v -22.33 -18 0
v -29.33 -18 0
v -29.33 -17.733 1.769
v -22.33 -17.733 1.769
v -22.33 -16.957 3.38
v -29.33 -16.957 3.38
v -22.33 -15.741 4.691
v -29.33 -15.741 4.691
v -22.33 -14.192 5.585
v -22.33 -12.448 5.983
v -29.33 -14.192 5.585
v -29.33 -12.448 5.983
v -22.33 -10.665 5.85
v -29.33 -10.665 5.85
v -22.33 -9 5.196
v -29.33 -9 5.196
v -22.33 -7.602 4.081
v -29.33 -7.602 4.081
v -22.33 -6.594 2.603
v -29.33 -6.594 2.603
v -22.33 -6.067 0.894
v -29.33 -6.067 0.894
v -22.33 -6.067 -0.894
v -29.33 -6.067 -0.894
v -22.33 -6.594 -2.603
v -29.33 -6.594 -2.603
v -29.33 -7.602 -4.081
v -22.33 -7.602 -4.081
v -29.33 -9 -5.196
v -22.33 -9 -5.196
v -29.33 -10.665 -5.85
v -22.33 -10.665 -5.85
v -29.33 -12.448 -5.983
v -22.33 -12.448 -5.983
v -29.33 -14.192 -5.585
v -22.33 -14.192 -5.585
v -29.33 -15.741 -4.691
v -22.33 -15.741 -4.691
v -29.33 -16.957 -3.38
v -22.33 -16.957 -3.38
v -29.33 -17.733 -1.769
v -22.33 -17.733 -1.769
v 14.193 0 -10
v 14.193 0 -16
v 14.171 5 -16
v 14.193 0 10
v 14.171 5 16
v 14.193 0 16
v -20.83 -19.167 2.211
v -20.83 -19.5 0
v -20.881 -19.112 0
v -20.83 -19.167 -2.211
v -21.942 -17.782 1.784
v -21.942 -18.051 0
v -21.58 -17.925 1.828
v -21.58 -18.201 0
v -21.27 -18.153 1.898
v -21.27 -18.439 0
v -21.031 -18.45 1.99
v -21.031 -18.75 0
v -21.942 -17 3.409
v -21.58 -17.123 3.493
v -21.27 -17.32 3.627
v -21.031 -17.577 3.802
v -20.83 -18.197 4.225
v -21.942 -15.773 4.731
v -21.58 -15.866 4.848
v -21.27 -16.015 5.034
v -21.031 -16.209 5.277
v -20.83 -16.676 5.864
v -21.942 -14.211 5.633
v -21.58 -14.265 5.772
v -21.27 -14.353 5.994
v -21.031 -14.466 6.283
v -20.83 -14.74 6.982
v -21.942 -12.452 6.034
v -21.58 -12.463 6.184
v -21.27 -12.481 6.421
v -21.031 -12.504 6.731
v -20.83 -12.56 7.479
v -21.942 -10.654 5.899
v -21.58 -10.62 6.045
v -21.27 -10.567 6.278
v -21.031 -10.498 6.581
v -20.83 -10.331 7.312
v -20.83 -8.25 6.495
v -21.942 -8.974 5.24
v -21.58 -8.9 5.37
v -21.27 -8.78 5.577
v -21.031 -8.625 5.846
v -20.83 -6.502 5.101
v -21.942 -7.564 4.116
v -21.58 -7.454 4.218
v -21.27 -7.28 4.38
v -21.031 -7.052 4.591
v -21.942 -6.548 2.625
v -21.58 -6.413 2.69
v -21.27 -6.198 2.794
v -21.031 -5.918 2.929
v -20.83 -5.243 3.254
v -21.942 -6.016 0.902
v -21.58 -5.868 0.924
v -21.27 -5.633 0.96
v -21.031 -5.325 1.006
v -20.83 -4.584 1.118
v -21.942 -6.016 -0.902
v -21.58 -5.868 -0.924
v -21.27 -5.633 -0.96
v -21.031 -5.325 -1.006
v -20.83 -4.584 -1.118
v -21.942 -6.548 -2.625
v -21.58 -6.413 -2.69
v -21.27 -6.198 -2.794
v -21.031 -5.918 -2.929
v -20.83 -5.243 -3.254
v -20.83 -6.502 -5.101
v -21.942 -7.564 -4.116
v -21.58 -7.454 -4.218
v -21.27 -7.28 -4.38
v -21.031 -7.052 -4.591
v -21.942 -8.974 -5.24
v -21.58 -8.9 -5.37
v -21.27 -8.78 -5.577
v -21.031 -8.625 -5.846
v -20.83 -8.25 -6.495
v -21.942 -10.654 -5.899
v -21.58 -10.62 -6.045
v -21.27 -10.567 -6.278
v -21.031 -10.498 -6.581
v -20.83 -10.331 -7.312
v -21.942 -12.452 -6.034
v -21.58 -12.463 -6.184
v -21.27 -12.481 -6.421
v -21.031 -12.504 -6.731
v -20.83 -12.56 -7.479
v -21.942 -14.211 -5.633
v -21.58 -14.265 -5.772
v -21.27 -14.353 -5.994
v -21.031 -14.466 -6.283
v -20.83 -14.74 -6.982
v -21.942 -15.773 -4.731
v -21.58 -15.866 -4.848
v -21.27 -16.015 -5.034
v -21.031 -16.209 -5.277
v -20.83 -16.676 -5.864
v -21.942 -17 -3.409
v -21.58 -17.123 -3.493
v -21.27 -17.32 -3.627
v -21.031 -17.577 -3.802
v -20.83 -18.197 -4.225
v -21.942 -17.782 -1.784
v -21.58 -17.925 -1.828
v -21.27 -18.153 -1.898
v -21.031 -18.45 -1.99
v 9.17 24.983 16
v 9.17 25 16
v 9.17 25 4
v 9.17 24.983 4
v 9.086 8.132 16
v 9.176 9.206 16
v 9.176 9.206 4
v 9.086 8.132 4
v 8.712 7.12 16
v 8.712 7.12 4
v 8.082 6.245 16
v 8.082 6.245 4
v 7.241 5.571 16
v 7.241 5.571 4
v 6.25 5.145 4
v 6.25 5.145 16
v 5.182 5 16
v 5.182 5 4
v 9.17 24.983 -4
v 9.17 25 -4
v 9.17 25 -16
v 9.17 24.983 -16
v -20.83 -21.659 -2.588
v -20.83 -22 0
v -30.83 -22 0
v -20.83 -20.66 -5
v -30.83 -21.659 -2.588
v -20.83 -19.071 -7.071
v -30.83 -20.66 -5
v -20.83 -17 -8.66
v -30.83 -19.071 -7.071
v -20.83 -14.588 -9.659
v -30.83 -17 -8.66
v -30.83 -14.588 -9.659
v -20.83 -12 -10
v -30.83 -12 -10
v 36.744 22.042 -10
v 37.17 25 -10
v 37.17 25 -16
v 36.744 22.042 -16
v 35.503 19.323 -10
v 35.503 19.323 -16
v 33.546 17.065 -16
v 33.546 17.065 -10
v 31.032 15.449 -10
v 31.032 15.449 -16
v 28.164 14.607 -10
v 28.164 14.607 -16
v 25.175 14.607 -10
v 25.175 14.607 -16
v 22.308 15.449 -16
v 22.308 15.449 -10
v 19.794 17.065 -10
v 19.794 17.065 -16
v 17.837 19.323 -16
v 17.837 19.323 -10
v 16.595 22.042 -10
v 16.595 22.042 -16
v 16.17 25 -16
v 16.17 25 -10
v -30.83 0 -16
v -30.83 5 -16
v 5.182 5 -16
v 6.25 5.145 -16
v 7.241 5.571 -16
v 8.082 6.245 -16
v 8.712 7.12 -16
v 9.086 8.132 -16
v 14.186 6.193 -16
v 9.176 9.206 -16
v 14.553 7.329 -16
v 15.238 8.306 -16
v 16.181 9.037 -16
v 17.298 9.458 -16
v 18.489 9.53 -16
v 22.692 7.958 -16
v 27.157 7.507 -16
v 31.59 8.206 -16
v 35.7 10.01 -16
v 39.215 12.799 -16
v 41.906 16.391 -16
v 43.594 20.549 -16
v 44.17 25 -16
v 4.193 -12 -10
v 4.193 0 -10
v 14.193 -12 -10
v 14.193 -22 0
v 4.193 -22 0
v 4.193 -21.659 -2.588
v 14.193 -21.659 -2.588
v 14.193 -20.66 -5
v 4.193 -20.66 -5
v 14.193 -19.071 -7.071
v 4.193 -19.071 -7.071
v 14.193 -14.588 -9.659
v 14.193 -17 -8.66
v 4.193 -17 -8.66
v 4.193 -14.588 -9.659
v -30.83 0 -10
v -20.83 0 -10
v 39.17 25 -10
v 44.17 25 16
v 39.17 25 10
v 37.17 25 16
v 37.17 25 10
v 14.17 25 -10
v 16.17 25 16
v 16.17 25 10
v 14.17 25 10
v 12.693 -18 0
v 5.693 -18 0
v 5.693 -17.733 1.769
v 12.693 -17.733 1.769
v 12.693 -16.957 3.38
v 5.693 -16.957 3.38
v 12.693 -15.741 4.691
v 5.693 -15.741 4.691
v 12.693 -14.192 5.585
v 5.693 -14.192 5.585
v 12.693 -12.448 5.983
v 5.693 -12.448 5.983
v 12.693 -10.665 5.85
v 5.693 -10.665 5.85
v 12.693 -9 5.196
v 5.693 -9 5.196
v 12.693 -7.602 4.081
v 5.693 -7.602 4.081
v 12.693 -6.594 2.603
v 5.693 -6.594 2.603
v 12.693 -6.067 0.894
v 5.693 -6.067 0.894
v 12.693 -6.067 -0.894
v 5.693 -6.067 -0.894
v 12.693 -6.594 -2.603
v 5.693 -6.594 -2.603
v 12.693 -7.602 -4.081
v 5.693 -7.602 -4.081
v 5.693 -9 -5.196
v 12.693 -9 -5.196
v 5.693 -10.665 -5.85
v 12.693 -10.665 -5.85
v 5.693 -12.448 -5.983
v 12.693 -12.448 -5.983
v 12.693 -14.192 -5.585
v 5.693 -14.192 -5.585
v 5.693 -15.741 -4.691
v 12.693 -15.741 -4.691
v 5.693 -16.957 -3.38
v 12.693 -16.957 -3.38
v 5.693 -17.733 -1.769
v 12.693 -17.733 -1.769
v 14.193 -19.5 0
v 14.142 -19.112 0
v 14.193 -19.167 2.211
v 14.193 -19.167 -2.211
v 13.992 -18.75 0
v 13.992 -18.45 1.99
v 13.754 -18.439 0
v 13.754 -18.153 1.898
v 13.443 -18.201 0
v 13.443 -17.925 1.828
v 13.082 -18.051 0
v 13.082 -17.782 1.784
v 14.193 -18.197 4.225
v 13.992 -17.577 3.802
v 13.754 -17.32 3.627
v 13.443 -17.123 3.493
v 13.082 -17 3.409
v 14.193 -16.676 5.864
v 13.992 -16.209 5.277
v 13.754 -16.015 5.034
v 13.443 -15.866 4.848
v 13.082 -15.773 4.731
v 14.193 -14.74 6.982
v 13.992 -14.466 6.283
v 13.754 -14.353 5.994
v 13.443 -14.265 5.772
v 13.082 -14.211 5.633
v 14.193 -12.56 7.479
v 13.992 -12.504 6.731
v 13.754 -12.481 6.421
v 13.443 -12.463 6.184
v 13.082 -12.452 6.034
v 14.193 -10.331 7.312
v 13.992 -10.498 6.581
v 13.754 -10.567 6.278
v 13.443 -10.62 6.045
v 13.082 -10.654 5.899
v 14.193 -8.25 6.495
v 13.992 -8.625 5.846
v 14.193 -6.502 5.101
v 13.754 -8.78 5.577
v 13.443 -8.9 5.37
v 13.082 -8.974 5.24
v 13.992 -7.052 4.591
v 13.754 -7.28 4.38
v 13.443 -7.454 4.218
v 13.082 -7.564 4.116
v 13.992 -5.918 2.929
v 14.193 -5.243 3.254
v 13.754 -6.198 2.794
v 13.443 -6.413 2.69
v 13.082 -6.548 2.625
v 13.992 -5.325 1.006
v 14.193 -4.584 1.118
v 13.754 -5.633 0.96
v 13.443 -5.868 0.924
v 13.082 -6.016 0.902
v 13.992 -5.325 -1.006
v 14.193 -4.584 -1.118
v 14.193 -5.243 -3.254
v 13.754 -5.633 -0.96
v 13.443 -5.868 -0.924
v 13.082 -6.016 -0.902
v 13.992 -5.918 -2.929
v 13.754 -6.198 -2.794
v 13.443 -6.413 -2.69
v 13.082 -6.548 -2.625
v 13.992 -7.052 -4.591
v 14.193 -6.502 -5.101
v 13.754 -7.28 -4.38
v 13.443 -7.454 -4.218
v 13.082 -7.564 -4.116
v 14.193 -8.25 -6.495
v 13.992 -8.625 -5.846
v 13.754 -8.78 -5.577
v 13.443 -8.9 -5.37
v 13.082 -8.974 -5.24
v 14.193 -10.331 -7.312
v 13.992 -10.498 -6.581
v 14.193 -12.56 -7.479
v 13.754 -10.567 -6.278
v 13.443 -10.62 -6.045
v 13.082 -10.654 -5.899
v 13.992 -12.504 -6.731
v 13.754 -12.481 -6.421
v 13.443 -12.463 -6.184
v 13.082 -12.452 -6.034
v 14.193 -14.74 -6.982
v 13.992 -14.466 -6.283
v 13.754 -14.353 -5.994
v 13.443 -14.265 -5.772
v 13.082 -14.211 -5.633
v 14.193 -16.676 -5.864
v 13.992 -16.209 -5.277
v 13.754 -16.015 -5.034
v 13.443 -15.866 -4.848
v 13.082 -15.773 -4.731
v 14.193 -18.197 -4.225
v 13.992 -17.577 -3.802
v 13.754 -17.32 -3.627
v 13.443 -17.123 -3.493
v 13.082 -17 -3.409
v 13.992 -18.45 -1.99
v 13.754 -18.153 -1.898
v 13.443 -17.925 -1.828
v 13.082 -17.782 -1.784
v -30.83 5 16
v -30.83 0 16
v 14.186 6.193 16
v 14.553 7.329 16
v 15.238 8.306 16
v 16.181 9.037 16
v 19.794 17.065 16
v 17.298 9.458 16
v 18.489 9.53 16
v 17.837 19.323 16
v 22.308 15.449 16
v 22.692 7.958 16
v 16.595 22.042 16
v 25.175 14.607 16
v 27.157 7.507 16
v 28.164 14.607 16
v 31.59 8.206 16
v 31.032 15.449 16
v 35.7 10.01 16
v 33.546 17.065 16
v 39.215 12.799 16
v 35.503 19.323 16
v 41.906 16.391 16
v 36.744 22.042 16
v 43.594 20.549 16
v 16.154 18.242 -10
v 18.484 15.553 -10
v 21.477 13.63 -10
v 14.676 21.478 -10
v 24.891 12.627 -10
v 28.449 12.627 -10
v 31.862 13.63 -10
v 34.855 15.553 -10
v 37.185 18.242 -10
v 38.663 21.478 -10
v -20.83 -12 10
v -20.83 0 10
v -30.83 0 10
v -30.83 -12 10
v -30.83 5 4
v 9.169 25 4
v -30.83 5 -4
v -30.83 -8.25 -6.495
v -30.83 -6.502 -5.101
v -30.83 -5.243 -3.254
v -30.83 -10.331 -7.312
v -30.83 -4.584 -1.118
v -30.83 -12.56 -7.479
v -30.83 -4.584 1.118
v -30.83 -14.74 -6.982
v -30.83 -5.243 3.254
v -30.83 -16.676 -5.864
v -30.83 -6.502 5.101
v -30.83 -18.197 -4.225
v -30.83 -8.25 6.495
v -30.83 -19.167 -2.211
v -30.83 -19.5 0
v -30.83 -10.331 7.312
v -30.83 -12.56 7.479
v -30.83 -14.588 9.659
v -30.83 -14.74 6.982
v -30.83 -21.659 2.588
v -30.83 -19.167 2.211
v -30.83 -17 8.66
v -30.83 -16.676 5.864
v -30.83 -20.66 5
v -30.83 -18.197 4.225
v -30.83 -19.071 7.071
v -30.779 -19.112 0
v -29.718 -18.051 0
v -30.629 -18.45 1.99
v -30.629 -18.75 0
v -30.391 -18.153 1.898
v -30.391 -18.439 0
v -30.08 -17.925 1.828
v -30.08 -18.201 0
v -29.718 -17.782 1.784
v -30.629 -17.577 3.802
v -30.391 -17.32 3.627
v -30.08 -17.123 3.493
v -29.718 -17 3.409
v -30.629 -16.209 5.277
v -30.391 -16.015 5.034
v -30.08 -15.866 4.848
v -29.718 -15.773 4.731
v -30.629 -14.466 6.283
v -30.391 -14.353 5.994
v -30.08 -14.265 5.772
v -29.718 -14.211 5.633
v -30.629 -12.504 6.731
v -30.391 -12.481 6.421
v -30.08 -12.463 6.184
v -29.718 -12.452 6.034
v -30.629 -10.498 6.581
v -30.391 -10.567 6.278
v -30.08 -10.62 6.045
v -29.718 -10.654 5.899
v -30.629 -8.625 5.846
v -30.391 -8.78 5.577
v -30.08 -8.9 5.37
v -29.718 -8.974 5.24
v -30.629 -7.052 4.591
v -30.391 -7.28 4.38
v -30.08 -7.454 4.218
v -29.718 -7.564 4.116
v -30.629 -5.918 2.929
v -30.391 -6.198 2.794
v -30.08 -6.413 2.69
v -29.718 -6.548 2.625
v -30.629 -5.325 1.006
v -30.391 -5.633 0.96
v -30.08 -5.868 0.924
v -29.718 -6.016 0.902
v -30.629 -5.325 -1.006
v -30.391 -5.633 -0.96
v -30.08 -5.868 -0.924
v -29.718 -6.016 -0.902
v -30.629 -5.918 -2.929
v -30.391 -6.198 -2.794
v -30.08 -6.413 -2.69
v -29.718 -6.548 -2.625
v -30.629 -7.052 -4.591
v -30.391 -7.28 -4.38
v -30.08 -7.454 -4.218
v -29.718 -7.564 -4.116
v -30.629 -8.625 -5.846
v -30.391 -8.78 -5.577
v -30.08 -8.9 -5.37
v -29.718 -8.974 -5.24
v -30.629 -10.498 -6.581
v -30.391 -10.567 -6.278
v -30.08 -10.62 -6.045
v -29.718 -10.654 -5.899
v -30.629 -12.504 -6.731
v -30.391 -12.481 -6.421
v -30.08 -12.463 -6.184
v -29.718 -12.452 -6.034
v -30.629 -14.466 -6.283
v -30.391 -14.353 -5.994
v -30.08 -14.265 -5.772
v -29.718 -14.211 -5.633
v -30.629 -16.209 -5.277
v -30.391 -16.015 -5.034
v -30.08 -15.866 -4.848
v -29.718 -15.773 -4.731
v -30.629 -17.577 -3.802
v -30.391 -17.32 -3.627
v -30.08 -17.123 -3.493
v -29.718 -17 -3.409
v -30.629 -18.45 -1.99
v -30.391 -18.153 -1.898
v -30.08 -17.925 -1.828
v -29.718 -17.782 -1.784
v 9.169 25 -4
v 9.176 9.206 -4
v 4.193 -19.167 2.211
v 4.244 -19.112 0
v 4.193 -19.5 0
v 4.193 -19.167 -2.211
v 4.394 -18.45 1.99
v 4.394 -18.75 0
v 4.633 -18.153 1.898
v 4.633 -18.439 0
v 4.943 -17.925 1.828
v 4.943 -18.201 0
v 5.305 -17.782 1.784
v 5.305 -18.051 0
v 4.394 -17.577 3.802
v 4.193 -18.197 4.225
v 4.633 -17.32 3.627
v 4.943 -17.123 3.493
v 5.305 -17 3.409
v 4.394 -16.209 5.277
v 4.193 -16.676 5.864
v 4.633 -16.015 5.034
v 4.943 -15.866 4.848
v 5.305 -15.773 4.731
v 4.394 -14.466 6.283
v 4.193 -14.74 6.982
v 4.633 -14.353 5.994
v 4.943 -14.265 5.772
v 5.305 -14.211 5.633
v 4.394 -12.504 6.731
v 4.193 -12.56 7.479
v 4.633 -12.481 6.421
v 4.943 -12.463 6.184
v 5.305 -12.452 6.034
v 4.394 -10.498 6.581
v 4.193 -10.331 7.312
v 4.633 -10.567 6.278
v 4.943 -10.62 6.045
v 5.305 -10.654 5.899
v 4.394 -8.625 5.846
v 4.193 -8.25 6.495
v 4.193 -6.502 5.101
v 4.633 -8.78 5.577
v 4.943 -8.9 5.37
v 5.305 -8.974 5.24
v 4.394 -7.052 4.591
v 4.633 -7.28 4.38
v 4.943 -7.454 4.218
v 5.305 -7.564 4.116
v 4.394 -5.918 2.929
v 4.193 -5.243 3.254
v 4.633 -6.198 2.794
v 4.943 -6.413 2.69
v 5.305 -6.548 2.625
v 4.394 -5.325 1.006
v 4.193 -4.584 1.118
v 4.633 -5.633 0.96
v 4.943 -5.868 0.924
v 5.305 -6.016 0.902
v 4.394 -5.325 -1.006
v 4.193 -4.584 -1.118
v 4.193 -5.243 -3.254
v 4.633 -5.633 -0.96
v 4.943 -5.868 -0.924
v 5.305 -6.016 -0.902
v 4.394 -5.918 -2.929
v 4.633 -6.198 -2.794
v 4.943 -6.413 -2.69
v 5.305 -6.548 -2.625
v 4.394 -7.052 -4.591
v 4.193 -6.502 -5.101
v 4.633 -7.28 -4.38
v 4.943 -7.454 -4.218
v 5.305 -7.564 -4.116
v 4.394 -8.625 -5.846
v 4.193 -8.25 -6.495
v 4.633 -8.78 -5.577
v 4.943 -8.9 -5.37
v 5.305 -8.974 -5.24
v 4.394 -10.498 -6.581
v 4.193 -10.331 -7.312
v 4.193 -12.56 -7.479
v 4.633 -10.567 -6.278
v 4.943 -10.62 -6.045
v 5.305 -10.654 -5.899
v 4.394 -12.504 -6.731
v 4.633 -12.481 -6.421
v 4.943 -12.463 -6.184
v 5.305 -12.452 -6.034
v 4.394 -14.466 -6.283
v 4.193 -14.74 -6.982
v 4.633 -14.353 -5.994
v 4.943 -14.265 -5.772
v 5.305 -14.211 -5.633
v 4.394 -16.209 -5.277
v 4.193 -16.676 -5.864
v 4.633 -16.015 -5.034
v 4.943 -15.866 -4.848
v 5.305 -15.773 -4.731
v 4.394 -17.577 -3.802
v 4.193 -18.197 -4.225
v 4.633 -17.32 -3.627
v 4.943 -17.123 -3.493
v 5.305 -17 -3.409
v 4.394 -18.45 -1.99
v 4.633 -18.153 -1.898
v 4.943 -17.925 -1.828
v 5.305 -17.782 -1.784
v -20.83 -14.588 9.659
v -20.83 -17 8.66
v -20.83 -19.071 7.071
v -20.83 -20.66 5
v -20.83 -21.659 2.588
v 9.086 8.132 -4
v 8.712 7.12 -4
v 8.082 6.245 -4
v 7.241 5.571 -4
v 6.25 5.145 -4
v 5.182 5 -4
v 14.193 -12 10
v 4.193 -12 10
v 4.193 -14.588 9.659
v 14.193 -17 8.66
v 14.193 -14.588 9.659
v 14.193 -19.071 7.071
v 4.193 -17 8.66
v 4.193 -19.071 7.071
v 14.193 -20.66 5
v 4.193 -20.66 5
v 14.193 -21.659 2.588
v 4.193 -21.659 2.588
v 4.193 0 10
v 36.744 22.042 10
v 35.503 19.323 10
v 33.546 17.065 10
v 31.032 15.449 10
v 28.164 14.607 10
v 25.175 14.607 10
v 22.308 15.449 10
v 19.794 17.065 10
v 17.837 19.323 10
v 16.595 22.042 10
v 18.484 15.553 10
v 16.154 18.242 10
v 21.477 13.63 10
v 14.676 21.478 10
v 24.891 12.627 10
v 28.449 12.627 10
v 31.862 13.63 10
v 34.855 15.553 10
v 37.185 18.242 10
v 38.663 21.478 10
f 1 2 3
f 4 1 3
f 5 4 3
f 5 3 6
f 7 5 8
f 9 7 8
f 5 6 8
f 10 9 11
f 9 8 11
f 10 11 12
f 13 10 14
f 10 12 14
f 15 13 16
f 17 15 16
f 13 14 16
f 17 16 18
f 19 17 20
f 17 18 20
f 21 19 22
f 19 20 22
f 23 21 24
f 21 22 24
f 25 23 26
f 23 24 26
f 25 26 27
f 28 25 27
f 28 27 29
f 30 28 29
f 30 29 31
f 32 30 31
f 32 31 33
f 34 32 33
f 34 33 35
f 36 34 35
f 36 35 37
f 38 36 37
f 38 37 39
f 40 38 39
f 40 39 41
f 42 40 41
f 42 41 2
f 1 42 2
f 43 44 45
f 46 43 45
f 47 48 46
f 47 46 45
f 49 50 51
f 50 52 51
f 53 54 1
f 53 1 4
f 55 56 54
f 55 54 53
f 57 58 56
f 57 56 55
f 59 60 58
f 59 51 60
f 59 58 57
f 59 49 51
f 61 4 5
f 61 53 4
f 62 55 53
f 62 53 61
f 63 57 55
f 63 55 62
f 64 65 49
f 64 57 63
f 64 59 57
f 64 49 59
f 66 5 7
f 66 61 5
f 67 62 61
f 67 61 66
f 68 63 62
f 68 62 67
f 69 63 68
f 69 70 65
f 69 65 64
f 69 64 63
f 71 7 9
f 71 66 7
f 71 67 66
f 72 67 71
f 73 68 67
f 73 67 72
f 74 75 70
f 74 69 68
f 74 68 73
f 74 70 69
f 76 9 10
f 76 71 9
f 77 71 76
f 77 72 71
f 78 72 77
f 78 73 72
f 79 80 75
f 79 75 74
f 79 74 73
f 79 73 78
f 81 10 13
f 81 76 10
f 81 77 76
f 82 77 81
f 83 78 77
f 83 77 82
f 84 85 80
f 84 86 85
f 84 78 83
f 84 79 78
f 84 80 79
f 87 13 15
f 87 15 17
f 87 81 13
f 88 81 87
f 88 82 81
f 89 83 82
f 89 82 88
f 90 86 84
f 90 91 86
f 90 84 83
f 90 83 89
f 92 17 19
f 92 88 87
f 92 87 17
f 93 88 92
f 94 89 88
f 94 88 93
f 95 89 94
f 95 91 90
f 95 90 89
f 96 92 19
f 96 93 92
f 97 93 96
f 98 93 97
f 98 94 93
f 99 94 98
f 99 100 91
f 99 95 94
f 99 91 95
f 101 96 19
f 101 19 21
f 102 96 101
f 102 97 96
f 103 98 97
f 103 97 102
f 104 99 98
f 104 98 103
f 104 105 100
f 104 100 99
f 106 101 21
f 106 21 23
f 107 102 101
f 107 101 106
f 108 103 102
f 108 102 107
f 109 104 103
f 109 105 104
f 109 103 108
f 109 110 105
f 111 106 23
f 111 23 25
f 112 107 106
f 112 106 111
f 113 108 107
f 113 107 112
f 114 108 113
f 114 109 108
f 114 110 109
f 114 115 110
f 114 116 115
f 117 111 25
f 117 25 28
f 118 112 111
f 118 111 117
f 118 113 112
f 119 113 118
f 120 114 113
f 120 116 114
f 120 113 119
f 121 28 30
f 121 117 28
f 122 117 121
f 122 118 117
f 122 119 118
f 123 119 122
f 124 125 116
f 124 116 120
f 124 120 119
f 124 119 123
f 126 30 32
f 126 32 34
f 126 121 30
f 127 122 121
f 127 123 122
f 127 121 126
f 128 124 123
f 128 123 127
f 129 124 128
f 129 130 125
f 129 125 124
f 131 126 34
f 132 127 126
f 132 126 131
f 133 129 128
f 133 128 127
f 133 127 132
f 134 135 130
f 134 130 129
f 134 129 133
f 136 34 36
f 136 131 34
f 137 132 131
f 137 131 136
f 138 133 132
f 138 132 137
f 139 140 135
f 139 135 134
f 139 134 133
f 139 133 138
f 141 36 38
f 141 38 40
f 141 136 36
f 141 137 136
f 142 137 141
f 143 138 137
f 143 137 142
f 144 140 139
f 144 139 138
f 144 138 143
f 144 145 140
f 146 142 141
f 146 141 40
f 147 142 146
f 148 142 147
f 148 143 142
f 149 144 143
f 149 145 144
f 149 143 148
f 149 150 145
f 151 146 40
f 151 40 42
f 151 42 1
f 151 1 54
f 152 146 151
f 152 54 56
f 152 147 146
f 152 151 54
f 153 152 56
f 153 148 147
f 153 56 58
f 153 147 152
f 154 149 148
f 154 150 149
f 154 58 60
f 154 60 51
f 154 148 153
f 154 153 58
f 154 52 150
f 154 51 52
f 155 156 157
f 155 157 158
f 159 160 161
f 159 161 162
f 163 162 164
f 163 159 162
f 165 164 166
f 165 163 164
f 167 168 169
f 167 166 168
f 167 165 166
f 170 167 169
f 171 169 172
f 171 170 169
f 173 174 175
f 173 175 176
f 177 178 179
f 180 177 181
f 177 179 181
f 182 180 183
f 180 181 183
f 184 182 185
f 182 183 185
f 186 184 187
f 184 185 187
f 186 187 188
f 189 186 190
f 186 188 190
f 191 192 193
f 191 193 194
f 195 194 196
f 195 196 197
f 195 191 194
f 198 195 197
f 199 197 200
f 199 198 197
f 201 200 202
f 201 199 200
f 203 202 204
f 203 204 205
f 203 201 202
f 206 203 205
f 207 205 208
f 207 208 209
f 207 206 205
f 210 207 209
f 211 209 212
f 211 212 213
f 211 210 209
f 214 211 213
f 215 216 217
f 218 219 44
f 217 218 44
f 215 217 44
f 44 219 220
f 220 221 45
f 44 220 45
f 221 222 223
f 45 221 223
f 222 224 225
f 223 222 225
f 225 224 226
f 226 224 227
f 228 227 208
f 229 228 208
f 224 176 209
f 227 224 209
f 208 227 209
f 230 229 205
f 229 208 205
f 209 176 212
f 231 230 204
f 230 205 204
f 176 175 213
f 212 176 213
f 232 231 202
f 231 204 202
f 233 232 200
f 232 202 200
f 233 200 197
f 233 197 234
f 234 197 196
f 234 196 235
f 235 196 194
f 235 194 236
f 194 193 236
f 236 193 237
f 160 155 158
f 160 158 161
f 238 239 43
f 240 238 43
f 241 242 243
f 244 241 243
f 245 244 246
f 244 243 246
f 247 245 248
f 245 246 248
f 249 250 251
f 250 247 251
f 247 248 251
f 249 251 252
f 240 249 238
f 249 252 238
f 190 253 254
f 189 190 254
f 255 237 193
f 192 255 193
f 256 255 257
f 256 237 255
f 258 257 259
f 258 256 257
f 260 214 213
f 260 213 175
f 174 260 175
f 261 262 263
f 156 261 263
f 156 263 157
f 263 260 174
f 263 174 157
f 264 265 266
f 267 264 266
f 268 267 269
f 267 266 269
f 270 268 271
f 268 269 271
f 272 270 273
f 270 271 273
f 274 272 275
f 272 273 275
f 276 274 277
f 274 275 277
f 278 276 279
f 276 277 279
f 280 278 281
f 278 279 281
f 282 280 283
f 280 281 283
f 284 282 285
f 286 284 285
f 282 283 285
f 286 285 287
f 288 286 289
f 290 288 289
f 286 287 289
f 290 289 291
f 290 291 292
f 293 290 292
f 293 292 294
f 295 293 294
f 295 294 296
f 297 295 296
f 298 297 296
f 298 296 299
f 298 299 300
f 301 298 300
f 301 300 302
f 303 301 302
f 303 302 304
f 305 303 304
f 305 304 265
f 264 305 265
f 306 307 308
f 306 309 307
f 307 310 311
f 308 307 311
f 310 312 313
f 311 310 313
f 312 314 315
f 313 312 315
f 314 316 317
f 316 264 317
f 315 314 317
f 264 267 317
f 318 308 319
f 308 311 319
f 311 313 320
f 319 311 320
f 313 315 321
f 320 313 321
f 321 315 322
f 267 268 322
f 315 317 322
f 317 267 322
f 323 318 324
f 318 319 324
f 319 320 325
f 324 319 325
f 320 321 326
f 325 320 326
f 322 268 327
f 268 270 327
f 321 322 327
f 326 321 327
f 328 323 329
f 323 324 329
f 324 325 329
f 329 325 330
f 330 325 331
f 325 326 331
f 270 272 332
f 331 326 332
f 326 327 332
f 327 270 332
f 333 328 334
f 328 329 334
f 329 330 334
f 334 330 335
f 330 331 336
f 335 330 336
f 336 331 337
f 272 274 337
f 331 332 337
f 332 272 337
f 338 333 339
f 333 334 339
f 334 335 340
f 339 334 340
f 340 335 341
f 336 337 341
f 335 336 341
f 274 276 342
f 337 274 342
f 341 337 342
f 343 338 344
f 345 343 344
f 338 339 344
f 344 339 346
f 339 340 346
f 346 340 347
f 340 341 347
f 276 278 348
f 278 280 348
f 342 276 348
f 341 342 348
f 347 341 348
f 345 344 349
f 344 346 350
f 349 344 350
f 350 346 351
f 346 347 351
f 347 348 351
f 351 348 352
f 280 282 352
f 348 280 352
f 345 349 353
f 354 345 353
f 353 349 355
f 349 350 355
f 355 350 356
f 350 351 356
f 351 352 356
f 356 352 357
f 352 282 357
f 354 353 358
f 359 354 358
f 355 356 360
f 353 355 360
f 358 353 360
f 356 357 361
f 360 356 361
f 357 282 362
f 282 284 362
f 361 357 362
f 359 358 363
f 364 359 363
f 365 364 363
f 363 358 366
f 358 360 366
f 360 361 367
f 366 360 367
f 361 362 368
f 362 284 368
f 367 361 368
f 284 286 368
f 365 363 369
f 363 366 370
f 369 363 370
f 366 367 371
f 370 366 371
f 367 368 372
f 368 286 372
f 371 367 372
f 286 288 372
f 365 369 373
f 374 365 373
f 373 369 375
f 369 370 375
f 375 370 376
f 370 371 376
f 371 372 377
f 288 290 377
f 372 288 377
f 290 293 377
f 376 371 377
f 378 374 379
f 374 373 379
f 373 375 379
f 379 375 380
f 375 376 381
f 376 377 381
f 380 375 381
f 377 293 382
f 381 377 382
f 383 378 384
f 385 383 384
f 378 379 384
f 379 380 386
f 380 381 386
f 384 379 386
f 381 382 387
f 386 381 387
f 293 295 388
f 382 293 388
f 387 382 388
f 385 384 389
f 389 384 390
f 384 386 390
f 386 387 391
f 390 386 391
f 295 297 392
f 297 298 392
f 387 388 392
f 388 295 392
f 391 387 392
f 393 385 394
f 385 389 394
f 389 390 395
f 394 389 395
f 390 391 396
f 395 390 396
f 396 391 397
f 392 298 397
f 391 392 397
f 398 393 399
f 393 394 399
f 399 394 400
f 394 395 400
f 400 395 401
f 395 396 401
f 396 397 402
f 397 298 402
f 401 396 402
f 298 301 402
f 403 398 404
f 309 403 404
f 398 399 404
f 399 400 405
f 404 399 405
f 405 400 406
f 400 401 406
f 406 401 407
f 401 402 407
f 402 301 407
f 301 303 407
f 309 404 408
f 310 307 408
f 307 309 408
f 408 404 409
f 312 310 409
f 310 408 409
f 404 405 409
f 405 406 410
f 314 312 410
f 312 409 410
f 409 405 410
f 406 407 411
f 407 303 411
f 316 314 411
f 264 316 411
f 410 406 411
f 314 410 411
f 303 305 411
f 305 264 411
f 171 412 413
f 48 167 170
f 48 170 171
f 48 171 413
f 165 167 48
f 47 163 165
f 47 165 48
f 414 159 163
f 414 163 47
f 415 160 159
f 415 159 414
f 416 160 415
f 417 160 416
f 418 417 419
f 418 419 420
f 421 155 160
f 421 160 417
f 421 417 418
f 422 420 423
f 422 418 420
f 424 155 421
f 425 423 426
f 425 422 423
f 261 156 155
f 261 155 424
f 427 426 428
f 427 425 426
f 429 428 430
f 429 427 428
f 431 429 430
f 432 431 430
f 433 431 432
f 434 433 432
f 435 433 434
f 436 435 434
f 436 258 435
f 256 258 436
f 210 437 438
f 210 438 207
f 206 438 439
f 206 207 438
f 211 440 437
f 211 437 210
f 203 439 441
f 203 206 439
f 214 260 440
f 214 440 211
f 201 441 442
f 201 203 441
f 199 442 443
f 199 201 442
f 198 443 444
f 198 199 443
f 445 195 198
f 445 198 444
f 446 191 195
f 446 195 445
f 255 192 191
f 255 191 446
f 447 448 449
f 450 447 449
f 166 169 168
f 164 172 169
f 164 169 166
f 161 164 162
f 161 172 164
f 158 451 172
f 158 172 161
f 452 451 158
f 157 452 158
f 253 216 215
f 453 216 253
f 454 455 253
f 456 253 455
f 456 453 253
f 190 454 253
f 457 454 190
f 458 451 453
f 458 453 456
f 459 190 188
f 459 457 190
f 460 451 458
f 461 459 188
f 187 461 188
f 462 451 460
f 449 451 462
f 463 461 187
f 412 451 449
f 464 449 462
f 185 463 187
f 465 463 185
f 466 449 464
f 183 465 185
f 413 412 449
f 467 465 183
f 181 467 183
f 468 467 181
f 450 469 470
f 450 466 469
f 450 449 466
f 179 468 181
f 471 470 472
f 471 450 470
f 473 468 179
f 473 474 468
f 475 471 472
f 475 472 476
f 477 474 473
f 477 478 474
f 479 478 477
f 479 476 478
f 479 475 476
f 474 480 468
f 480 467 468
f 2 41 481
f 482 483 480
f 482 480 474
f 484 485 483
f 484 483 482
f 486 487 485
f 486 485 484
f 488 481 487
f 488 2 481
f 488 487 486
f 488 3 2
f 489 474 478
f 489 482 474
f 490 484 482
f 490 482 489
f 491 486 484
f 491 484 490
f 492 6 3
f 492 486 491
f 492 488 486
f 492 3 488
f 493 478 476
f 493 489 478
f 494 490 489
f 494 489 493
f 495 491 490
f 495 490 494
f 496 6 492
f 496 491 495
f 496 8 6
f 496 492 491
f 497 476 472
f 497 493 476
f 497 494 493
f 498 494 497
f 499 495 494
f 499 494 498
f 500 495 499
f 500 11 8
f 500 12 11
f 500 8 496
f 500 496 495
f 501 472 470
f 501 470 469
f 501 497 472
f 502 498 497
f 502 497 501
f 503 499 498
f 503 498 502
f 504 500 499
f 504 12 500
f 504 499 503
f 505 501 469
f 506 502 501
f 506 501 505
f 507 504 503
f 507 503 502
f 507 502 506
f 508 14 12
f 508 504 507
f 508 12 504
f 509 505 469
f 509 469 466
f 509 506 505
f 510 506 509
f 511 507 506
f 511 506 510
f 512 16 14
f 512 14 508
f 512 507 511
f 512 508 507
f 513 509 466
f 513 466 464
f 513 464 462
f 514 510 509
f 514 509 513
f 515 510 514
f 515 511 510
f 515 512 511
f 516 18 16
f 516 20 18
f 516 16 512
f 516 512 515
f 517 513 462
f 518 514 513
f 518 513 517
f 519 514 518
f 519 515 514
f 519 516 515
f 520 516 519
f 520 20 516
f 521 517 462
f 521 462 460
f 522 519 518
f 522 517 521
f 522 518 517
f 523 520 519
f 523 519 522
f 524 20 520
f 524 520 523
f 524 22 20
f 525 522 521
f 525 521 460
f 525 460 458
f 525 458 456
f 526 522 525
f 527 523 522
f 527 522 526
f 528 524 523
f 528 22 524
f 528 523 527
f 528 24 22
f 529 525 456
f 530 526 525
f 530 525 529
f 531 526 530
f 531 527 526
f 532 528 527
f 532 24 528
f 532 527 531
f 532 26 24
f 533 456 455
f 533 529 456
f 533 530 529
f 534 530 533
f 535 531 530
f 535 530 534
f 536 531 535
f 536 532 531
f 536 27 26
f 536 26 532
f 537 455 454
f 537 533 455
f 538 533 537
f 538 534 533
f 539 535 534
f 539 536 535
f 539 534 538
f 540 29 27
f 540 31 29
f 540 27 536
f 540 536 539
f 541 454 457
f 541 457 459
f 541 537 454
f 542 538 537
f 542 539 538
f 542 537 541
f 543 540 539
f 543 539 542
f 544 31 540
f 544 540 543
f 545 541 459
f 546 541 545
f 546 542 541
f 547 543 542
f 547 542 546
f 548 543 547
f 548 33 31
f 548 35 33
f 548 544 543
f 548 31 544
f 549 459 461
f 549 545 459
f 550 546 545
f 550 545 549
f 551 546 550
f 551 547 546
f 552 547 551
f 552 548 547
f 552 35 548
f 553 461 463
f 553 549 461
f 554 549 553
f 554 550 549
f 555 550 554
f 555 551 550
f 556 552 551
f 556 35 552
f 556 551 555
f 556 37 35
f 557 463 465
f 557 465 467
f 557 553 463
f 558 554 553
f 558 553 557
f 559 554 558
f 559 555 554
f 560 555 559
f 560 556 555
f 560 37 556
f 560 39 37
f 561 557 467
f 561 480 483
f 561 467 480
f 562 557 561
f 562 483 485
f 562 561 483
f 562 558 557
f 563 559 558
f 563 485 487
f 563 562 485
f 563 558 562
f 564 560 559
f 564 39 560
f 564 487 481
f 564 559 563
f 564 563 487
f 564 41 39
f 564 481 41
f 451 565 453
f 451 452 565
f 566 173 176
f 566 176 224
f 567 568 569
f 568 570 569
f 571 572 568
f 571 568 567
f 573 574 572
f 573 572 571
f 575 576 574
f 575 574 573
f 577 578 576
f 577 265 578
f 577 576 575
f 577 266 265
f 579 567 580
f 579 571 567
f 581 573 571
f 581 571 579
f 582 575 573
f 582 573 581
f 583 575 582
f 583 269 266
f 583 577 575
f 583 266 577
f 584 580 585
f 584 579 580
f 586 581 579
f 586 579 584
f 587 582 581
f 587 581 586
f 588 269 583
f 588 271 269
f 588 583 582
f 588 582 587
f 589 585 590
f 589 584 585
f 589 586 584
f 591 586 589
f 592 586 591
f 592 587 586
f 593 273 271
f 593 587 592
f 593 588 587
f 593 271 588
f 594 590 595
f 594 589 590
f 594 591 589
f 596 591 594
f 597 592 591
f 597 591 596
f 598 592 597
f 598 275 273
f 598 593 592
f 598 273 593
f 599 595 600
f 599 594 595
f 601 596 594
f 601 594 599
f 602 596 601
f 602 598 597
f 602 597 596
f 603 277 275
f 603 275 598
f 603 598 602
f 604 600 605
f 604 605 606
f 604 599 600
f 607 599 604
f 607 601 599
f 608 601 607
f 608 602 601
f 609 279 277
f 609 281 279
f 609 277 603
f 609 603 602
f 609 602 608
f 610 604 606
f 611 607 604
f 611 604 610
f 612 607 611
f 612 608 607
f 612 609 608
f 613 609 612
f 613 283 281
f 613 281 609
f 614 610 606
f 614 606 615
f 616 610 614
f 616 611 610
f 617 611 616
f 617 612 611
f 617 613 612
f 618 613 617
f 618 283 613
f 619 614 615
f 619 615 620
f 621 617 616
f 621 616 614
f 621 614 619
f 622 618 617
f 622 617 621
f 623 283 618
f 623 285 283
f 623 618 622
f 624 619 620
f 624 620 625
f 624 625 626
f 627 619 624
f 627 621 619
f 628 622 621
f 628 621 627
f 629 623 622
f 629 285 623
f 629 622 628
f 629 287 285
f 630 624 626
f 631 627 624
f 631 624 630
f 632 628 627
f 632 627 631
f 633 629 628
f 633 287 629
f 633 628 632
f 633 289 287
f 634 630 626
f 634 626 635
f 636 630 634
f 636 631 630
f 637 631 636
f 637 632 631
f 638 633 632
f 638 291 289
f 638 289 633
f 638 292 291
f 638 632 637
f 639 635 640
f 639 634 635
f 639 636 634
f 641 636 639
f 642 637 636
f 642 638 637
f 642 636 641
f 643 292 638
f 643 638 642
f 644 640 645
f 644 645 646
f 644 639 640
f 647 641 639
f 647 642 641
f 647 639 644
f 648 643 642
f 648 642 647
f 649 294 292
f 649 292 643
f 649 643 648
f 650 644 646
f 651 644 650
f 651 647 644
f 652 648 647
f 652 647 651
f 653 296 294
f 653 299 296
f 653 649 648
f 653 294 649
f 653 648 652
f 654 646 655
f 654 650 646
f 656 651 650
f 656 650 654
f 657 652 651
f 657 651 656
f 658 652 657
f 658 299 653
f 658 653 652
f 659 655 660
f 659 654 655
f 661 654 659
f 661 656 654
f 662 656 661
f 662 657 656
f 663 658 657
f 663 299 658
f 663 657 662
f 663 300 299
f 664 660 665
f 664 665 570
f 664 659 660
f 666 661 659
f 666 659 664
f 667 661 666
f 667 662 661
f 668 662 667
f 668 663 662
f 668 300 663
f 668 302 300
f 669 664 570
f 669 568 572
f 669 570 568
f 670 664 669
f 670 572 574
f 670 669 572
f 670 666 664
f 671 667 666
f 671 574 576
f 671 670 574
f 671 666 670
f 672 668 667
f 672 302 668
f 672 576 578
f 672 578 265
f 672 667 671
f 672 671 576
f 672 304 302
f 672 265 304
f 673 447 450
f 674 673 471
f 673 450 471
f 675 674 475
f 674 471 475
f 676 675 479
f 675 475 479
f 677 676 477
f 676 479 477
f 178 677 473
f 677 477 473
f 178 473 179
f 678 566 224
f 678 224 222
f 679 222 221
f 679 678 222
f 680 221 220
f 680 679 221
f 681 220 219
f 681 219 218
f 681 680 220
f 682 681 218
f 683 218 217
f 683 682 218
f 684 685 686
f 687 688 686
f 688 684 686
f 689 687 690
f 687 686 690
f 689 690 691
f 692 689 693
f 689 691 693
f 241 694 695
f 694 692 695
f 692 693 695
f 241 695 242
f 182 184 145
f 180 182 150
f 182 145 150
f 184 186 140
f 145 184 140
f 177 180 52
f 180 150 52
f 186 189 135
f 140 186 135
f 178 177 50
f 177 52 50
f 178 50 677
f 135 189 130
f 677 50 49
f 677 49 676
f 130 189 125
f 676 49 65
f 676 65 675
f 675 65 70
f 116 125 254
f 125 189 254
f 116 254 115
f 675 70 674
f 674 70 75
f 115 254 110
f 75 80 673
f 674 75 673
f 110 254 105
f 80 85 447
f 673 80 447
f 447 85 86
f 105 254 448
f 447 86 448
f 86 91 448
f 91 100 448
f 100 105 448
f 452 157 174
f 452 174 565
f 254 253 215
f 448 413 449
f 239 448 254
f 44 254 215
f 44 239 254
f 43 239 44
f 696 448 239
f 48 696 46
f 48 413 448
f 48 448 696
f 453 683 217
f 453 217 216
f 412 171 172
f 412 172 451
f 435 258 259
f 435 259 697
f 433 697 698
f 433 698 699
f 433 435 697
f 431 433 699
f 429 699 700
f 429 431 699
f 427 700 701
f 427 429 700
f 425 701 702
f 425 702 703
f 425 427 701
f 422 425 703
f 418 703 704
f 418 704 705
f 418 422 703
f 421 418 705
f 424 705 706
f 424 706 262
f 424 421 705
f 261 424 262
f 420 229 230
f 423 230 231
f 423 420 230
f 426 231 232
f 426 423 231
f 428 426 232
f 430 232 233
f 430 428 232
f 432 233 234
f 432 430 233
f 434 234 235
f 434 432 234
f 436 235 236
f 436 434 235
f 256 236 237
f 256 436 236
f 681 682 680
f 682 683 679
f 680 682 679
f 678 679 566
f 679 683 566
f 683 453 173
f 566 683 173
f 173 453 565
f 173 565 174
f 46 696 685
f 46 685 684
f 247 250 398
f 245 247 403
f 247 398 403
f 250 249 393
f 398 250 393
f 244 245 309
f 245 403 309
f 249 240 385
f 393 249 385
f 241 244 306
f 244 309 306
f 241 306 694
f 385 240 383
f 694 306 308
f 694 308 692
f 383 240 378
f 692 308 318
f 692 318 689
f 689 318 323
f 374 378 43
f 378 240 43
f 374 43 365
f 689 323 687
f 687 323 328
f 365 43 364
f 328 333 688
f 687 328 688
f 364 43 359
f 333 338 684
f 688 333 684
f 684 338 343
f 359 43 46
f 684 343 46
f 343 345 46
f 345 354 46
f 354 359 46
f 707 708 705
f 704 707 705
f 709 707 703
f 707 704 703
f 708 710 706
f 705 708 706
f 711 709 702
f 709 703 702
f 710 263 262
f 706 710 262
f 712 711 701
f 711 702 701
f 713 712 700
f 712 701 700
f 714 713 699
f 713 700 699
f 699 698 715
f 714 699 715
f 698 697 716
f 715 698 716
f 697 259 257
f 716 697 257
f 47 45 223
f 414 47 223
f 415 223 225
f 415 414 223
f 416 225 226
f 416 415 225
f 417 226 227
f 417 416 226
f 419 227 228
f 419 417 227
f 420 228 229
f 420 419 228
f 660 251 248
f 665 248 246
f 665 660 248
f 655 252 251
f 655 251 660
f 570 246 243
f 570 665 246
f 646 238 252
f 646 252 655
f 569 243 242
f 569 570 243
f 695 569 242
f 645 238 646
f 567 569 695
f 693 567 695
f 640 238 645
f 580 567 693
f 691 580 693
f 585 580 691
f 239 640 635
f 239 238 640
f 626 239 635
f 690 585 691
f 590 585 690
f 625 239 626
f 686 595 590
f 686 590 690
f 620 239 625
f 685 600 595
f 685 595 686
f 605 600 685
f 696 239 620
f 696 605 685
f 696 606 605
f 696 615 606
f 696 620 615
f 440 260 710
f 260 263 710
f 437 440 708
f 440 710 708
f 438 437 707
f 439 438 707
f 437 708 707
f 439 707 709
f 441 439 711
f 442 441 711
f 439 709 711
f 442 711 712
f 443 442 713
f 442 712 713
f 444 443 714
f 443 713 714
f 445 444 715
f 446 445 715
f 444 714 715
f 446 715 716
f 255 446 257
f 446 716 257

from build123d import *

# Parameters (mm, degrees)
F1_DEPTH = 16
F2_DEPTH = 4
F3_DEPTH = 10
F4_W     = 10
F4_H     = 20
F5_DEPTH = 22
F6_R     = 6
F7_DEPTH = 75.0009999306
F8_R     = 1.5


# Not quite as in the source:
# - ends of sketch curves that miss each other by under 0.0002 mm in the source are joined


with BuildPart() as f1:
    # F0 (on Top) → F1 (new body, symmetric)
    with BuildSketch(Plane.XY):
        Polygon((14.1706688348, 5), (5.1815587922, 5), (-30.8302634659, 5), (-30.8302634659, 0), (14.1933665337, 0), align=None)
        with BuildLine():
            ThreePointArc((9.1762328499, 9.2063472144), (8.0820233117, 6.2454935885), (5.1815587922, 5))
            Line((5.1815587922, 5), (14.1706688348, 5))
            ThreePointArc((14.1706688348, 5), (15.2379483, 8.3057115079), (18.4888007758, 9.5299550339))
            ThreePointArc((18.4888007758, 9.5299550339), (35.6997870029, 10.0097302467), (44.1697364647, 25))
            Line((44.1697364647, 25), (39.1697364647, 25))
            ThreePointArc((39.1697364647, 25), (26.6697364647, 12.5), (14.1697364647, 25))
            Line((14.1697364647, 25), (9.169736973, 25))
            Line((9.169736973, 25), (9.1697442854, 24.9834553538))
            Line((9.1697442854, 24.9834553538), (9.1762328499, 9.2063472144))
        make_face()
        with BuildLine():
            Line((14.1706688348, 25), (14.1697364647, 25))
            ThreePointArc((14.1697364647, 25), (26.6697364647, 12.5), (39.1697364647, 25))
            Line((39.1697364647, 25), (37.1697364647, 25))
            ThreePointArc((37.1697364647, 25), (26.6697364647, 14.5), (16.1697364647, 25))
            Line((16.1697364647, 25), (14.1706688348, 25))
        make_face()
    extrude(amount=F1_DEPTH, both=True)

    # F0 (on Top) → F2 (join, symmetric)
    with BuildSketch(Plane.XY):
        with BuildLine():
            Line((-30.8302634659, 5), (5.1815587922, 5))
            ThreePointArc((5.1815587922, 5), (8.0820233117, 6.2454935885), (9.1762328499, 9.2063472144))
            Line((9.1762328499, 9.2063472144), (9.1697442854, 24.9834553538))
            Line((9.1697442854, 24.9834553538), (9.1697374812, 25.0000000002))
            Line((9.1697374812, 25.0000000002), (9.168883179, 25))
            Line((9.168883179, 25), (-30.8302634659, 5))
        make_face()
    extrude(amount=F2_DEPTH, both=True)

    # F0 (on Top) → F3 (cut, symmetric)
    with BuildSketch(Plane.XY):
        with BuildLine():
            Line((14.1706688348, 25), (14.1697364647, 25))
            ThreePointArc((14.1697364647, 25), (26.6697364647, 12.5), (39.1697364647, 25))
            Line((39.1697364647, 25), (37.1697364647, 25))
            ThreePointArc((37.1697364647, 25), (26.6697364647, 14.5), (16.1697364647, 25))
            Line((16.1697364647, 25), (14.1706688348, 25))
        make_face()
    extrude(amount=F3_DEPTH, both=True, mode=Mode.SUBTRACT)

    # F4 (on face) → F5 (join)
    with BuildSketch(Plane.XZ):
        with Locations((9.1933665337, 0)):
            Rectangle(F4_W, F4_H)
        Polygon((-20.8302634659, 10), (-30.8302634659, 10), (-30.8302634659, 0), (-30.8302634659, -10), (-20.8302634659, -10), align=None)
    extrude(amount=F5_DEPTH)

    # F6 (on face) → F7 (cut, through all)
    with BuildSketch(Plane(origin=(-30.8302634659, 0, 0), x_dir=(0, -1, 0), z_dir=(-1, 0, 0))):
        with BuildLine():
            Line((22, 10), (12, 10))
            ThreePointArc((12, 10), (19.0710677836, 7.0710678402), (22, 8.01e-08))
            Line((22, 8.01e-08), (22, 10))
        make_face()
        with BuildLine():
            Line((22, -10), (22, 8.01e-08))
            ThreePointArc((22, 8.01e-08), (19.0710678402, -7.0710677836), (12, -10))
            Line((12, -10), (22, -10))
        make_face()
        with Locations((12, 0)):
            Circle(F6_R)
    extrude(amount=-F7_DEPTH, mode=Mode.SUBTRACT)

    # F8
    f8_edges = [f1.edges().sort_by_distance(p)[0] for p in [
        (-30.830263, -6, 0),
        (-20.830263, -6, 0),
        (14.193367, -6, 0),
        (4.193367, -6, 0),
    ]]
    fillet(f8_edges, radius=F8_R)


solid = f1.part
